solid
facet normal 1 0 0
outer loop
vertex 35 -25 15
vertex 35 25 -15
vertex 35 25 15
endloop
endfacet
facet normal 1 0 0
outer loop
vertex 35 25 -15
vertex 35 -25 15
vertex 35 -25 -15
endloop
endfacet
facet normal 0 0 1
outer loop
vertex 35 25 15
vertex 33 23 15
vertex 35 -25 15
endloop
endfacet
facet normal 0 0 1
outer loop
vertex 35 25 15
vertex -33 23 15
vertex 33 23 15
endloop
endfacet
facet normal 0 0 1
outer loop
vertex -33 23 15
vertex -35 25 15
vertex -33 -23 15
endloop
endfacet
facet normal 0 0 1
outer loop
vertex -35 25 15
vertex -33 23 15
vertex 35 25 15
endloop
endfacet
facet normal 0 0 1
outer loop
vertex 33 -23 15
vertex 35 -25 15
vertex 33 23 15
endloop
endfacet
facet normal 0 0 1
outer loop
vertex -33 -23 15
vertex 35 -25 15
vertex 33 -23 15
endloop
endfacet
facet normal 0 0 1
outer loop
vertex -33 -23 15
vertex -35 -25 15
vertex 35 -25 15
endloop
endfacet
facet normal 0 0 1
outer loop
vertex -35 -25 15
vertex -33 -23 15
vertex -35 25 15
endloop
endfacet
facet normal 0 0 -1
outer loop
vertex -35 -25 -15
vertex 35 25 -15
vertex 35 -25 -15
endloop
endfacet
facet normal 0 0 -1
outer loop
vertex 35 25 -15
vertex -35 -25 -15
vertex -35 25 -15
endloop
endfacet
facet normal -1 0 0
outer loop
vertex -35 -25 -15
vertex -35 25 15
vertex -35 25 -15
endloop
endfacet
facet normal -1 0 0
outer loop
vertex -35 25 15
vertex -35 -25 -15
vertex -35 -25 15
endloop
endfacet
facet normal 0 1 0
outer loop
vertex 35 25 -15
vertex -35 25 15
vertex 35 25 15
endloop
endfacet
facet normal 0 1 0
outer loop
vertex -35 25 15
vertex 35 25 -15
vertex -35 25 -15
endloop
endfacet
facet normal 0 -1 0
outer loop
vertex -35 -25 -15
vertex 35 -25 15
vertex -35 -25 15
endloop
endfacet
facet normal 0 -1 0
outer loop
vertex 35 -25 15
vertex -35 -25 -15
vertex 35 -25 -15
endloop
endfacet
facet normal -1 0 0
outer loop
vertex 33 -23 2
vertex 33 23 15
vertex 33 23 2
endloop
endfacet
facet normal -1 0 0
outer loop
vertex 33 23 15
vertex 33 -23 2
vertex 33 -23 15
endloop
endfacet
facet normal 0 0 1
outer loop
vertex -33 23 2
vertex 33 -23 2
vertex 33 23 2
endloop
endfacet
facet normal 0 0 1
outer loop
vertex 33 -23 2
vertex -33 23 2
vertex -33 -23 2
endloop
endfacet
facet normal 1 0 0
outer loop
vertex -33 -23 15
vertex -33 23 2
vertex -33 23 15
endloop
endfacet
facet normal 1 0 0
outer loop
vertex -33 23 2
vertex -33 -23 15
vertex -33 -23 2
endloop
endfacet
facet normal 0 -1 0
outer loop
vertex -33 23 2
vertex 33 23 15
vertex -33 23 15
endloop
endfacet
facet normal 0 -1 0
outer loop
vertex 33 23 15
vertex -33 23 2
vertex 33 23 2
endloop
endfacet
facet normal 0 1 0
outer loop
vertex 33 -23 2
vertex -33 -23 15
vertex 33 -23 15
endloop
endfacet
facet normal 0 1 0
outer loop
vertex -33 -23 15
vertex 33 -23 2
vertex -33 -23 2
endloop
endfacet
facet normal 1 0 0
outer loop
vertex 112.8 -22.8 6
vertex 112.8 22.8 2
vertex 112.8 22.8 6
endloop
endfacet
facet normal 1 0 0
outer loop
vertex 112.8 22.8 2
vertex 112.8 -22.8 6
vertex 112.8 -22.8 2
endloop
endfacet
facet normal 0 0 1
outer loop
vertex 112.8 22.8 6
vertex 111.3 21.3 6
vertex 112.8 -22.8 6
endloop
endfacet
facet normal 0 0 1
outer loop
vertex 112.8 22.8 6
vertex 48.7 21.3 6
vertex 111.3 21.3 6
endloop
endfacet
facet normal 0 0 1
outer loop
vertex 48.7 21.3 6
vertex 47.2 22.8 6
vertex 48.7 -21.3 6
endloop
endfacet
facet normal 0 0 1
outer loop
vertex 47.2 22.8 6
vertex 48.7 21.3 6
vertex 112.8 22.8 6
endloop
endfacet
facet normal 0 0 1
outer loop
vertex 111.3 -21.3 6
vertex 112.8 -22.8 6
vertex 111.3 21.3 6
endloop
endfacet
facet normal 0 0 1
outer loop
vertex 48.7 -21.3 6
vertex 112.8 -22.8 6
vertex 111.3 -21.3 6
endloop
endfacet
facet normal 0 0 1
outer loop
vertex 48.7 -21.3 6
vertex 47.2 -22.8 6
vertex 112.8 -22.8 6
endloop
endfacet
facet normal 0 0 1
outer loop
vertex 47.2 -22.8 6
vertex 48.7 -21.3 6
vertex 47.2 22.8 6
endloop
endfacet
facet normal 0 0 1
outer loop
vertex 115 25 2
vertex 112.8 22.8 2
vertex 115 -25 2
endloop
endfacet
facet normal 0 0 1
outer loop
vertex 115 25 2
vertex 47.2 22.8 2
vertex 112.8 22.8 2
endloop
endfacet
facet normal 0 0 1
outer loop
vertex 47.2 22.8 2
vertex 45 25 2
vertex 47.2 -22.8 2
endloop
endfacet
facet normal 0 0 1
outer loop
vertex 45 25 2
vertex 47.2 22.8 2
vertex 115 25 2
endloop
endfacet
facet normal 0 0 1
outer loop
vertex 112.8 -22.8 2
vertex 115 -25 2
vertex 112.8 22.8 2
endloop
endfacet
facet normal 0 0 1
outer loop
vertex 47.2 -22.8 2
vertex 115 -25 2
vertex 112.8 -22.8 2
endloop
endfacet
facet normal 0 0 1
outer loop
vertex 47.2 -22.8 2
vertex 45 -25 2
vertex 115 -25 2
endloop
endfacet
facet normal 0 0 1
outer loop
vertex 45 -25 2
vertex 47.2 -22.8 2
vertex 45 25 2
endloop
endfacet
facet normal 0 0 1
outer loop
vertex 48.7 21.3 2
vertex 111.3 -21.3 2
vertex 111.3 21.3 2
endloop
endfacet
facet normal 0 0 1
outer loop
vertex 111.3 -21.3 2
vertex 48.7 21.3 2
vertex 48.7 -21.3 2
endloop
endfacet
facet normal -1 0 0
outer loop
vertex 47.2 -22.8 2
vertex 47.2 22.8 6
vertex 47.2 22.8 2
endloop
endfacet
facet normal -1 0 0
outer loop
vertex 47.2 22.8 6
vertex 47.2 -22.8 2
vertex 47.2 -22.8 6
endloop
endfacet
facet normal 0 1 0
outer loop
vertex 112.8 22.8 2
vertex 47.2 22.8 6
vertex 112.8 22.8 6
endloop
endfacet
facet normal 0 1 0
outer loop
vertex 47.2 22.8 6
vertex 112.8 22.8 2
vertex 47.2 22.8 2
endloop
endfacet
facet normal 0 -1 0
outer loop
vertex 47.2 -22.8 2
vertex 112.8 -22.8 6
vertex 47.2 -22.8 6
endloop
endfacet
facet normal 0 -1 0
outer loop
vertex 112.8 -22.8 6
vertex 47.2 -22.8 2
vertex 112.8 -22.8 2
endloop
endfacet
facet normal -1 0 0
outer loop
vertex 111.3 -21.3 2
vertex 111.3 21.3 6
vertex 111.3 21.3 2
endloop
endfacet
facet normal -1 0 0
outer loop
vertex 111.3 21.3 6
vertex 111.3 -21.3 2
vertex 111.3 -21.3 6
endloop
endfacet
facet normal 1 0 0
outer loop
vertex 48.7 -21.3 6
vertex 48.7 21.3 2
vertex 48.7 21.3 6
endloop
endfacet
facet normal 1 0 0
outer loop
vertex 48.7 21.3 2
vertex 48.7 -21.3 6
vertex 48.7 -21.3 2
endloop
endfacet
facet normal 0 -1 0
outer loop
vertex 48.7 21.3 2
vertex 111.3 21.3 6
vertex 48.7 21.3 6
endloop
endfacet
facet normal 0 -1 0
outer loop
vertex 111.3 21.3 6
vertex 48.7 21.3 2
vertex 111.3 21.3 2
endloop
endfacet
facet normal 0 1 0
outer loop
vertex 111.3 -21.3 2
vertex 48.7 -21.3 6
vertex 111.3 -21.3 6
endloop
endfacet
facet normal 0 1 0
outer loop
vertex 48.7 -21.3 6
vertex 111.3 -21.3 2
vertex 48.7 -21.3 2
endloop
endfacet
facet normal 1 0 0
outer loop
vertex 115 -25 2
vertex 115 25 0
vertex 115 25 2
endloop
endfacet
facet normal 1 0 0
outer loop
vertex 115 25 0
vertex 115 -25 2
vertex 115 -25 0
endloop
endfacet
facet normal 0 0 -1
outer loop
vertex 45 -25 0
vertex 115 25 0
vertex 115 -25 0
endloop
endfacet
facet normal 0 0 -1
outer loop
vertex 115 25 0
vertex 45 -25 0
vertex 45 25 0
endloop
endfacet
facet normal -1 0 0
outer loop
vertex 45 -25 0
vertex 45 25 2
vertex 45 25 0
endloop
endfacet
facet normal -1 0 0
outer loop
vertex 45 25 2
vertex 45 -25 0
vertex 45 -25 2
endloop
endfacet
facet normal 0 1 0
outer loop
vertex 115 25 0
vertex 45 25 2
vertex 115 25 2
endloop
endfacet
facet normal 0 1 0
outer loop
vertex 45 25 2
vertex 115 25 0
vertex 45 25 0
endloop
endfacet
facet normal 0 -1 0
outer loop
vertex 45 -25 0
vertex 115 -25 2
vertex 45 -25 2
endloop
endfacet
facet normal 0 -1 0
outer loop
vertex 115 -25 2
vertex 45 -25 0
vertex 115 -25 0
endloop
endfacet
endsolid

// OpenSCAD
// Two-part enclosure for a small electronics board (Arduino temperature logger)
// Part 1: Box (open top, 2 mm walls, 2 mm floor)
// Part 2: Lid (printed upside down, plate + rectangular lip)
// Both parts print side-by-side with a 10 mm gap.

$fn = 64;

// ===================== BOX DIMENSIONS =====================
box_outer_x = 70;   // outer X size
box_outer_y = 50;   // outer Y size
box_outer_z = 30;   // outer Z height
wall_t = 2;         // wall thickness
floor_t = 2;        // floor thickness

// ===================== LID DIMENSIONS =====================
lid_plate_x = 70;   // plate X size
lid_plate_y = 50;   // plate Y size
lid_plate_t = 2;    // plate thickness (lies on bed)
lip_wall_t = 1.5;   // lip wall thickness
lip_h = 4;          // lip height (extends upward from plate in print orientation)
lip_outer_x = 65.6; // lip outer X size
lip_outer_y = 45.6; // lip outer Y size

// ===================== LAYOUT =====================
gap = 10;           // gap between box and lid

// Box is centred on origin in X and Y
// Box occupies X: -35 to +35, Y: -25 to +25, Z: 0 to 30

// Lid is on the +X side of the box
// Lid plate centred at X = 35 + gap + 35 = 80, Y = 0
// Lid occupies X: 80-35=45 to 80+35=115, Y: -25 to 25, Z: 0 to 2 (plate) + 4 (lip) = 6

// ===================== PART 1: BOX =====================
// Box: outer 70x50x30, 2mm walls, 2mm floor, open top
// Build as outer box minus inner cavity (open top)

module box_part() {
    difference() {
        // Outer solid, centred on origin
        cube([box_outer_x, box_outer_y, box_outer_z], center = true);
        
        // Inner cavity: starts at z = floor_t, goes up past the top (open top)
        // Cavity dimensions: (box_outer_x - 2*wall_t) x (box_outer_y - 2*wall_t) x (box_outer_z - floor_t + 1)
        // The +1 ensures the cut extends past the top face
        cavity_x = box_outer_x - 2 * wall_t;
        cavity_y = box_outer_y - 2 * wall_t;
        cavity_z = box_outer_z - floor_t + 1;  // extend 1mm past top to ensure clean cut
        
        // Cavity is centred in X and Y, starts at z = floor_t
        // So translate to: x=0, y=0, z = floor_t + cavity_z/2
        // But we want the cavity bottom at z = floor_t, so centre z = floor_t + cavity_z/2
        translate([0, 0, floor_t + cavity_z / 2]) 
            cube([cavity_x, cavity_y, cavity_z], center = true);
    }
}

// ===================== PART 2: LID (printed upside down) =====================
// Lid plate: 70 x 50 x 2, lying on bed (z=0 to z=2)
// Lip: 1.5mm thick wall, 4mm tall, outer 65.6 x 45.6, centred on plate
// Lip sits on top of plate: z=2 to z=6
// The lip is a rectangular ring (hollow rectangle)

module lid_part() {
    union() {
        // Plate, centred on origin in X and Y, sitting on bed
        translate([0, 0, lid_plate_t / 2]) 
            cube([lid_plate_x, lid_plate_y, lid_plate_t], center = true);
        
        // Lip: outer rectangle minus inner rectangle
        // Outer: lip_outer_x x lip_outer_y x lip_h
        // Inner: (lip_outer_x - 2*lip_wall_t) x (lip_outer_y - 2*lip_wall_t) x (lip_h + 1)
        // The +1 in Z ensures the inner cut extends past the top of the lip
        
        // Lip is centred on the plate, sitting on top of it
        // Plate top is at z = lid_plate_t
        // Lip bottom is at z = lid_plate_t, lip top is at z = lid_plate_t + lip_h
        // So lip centre z = lid_plate_t + lip_h / 2
        
        difference() {
            translate([0, 0, lid_plate_t + lip_h / 2]) 
                cube([lip_outer_x, lip_outer_y, lip_h], center = true);
            
            lip_inner_x = lip_outer_x - 2 * lip_wall_t;
            lip_inner_y = lip_outer_y - 2 * lip_wall_t;
            lip_inner_z = lip_h + 1;  // extend 1mm past top
            
            translate([0, 0, lid_plate_t + lip_inner_z / 2]) 
                cube([lip_inner_x, lip_inner_y, lip_inner_z], center = true);
        }
    }
}

// ===================== PLACE PARTS ON BED =====================
// Box centred at origin
translate([0, 0, 0]) box_part();

// Lid on +X side, with 10mm gap
// Box right edge at x = 35
// Lid left edge should be at x = 35 + 10 = 45
// Lid is 70mm wide, so lid centre x = 45 + 35 = 80
translate([80, 0, 0]) lid_part();
